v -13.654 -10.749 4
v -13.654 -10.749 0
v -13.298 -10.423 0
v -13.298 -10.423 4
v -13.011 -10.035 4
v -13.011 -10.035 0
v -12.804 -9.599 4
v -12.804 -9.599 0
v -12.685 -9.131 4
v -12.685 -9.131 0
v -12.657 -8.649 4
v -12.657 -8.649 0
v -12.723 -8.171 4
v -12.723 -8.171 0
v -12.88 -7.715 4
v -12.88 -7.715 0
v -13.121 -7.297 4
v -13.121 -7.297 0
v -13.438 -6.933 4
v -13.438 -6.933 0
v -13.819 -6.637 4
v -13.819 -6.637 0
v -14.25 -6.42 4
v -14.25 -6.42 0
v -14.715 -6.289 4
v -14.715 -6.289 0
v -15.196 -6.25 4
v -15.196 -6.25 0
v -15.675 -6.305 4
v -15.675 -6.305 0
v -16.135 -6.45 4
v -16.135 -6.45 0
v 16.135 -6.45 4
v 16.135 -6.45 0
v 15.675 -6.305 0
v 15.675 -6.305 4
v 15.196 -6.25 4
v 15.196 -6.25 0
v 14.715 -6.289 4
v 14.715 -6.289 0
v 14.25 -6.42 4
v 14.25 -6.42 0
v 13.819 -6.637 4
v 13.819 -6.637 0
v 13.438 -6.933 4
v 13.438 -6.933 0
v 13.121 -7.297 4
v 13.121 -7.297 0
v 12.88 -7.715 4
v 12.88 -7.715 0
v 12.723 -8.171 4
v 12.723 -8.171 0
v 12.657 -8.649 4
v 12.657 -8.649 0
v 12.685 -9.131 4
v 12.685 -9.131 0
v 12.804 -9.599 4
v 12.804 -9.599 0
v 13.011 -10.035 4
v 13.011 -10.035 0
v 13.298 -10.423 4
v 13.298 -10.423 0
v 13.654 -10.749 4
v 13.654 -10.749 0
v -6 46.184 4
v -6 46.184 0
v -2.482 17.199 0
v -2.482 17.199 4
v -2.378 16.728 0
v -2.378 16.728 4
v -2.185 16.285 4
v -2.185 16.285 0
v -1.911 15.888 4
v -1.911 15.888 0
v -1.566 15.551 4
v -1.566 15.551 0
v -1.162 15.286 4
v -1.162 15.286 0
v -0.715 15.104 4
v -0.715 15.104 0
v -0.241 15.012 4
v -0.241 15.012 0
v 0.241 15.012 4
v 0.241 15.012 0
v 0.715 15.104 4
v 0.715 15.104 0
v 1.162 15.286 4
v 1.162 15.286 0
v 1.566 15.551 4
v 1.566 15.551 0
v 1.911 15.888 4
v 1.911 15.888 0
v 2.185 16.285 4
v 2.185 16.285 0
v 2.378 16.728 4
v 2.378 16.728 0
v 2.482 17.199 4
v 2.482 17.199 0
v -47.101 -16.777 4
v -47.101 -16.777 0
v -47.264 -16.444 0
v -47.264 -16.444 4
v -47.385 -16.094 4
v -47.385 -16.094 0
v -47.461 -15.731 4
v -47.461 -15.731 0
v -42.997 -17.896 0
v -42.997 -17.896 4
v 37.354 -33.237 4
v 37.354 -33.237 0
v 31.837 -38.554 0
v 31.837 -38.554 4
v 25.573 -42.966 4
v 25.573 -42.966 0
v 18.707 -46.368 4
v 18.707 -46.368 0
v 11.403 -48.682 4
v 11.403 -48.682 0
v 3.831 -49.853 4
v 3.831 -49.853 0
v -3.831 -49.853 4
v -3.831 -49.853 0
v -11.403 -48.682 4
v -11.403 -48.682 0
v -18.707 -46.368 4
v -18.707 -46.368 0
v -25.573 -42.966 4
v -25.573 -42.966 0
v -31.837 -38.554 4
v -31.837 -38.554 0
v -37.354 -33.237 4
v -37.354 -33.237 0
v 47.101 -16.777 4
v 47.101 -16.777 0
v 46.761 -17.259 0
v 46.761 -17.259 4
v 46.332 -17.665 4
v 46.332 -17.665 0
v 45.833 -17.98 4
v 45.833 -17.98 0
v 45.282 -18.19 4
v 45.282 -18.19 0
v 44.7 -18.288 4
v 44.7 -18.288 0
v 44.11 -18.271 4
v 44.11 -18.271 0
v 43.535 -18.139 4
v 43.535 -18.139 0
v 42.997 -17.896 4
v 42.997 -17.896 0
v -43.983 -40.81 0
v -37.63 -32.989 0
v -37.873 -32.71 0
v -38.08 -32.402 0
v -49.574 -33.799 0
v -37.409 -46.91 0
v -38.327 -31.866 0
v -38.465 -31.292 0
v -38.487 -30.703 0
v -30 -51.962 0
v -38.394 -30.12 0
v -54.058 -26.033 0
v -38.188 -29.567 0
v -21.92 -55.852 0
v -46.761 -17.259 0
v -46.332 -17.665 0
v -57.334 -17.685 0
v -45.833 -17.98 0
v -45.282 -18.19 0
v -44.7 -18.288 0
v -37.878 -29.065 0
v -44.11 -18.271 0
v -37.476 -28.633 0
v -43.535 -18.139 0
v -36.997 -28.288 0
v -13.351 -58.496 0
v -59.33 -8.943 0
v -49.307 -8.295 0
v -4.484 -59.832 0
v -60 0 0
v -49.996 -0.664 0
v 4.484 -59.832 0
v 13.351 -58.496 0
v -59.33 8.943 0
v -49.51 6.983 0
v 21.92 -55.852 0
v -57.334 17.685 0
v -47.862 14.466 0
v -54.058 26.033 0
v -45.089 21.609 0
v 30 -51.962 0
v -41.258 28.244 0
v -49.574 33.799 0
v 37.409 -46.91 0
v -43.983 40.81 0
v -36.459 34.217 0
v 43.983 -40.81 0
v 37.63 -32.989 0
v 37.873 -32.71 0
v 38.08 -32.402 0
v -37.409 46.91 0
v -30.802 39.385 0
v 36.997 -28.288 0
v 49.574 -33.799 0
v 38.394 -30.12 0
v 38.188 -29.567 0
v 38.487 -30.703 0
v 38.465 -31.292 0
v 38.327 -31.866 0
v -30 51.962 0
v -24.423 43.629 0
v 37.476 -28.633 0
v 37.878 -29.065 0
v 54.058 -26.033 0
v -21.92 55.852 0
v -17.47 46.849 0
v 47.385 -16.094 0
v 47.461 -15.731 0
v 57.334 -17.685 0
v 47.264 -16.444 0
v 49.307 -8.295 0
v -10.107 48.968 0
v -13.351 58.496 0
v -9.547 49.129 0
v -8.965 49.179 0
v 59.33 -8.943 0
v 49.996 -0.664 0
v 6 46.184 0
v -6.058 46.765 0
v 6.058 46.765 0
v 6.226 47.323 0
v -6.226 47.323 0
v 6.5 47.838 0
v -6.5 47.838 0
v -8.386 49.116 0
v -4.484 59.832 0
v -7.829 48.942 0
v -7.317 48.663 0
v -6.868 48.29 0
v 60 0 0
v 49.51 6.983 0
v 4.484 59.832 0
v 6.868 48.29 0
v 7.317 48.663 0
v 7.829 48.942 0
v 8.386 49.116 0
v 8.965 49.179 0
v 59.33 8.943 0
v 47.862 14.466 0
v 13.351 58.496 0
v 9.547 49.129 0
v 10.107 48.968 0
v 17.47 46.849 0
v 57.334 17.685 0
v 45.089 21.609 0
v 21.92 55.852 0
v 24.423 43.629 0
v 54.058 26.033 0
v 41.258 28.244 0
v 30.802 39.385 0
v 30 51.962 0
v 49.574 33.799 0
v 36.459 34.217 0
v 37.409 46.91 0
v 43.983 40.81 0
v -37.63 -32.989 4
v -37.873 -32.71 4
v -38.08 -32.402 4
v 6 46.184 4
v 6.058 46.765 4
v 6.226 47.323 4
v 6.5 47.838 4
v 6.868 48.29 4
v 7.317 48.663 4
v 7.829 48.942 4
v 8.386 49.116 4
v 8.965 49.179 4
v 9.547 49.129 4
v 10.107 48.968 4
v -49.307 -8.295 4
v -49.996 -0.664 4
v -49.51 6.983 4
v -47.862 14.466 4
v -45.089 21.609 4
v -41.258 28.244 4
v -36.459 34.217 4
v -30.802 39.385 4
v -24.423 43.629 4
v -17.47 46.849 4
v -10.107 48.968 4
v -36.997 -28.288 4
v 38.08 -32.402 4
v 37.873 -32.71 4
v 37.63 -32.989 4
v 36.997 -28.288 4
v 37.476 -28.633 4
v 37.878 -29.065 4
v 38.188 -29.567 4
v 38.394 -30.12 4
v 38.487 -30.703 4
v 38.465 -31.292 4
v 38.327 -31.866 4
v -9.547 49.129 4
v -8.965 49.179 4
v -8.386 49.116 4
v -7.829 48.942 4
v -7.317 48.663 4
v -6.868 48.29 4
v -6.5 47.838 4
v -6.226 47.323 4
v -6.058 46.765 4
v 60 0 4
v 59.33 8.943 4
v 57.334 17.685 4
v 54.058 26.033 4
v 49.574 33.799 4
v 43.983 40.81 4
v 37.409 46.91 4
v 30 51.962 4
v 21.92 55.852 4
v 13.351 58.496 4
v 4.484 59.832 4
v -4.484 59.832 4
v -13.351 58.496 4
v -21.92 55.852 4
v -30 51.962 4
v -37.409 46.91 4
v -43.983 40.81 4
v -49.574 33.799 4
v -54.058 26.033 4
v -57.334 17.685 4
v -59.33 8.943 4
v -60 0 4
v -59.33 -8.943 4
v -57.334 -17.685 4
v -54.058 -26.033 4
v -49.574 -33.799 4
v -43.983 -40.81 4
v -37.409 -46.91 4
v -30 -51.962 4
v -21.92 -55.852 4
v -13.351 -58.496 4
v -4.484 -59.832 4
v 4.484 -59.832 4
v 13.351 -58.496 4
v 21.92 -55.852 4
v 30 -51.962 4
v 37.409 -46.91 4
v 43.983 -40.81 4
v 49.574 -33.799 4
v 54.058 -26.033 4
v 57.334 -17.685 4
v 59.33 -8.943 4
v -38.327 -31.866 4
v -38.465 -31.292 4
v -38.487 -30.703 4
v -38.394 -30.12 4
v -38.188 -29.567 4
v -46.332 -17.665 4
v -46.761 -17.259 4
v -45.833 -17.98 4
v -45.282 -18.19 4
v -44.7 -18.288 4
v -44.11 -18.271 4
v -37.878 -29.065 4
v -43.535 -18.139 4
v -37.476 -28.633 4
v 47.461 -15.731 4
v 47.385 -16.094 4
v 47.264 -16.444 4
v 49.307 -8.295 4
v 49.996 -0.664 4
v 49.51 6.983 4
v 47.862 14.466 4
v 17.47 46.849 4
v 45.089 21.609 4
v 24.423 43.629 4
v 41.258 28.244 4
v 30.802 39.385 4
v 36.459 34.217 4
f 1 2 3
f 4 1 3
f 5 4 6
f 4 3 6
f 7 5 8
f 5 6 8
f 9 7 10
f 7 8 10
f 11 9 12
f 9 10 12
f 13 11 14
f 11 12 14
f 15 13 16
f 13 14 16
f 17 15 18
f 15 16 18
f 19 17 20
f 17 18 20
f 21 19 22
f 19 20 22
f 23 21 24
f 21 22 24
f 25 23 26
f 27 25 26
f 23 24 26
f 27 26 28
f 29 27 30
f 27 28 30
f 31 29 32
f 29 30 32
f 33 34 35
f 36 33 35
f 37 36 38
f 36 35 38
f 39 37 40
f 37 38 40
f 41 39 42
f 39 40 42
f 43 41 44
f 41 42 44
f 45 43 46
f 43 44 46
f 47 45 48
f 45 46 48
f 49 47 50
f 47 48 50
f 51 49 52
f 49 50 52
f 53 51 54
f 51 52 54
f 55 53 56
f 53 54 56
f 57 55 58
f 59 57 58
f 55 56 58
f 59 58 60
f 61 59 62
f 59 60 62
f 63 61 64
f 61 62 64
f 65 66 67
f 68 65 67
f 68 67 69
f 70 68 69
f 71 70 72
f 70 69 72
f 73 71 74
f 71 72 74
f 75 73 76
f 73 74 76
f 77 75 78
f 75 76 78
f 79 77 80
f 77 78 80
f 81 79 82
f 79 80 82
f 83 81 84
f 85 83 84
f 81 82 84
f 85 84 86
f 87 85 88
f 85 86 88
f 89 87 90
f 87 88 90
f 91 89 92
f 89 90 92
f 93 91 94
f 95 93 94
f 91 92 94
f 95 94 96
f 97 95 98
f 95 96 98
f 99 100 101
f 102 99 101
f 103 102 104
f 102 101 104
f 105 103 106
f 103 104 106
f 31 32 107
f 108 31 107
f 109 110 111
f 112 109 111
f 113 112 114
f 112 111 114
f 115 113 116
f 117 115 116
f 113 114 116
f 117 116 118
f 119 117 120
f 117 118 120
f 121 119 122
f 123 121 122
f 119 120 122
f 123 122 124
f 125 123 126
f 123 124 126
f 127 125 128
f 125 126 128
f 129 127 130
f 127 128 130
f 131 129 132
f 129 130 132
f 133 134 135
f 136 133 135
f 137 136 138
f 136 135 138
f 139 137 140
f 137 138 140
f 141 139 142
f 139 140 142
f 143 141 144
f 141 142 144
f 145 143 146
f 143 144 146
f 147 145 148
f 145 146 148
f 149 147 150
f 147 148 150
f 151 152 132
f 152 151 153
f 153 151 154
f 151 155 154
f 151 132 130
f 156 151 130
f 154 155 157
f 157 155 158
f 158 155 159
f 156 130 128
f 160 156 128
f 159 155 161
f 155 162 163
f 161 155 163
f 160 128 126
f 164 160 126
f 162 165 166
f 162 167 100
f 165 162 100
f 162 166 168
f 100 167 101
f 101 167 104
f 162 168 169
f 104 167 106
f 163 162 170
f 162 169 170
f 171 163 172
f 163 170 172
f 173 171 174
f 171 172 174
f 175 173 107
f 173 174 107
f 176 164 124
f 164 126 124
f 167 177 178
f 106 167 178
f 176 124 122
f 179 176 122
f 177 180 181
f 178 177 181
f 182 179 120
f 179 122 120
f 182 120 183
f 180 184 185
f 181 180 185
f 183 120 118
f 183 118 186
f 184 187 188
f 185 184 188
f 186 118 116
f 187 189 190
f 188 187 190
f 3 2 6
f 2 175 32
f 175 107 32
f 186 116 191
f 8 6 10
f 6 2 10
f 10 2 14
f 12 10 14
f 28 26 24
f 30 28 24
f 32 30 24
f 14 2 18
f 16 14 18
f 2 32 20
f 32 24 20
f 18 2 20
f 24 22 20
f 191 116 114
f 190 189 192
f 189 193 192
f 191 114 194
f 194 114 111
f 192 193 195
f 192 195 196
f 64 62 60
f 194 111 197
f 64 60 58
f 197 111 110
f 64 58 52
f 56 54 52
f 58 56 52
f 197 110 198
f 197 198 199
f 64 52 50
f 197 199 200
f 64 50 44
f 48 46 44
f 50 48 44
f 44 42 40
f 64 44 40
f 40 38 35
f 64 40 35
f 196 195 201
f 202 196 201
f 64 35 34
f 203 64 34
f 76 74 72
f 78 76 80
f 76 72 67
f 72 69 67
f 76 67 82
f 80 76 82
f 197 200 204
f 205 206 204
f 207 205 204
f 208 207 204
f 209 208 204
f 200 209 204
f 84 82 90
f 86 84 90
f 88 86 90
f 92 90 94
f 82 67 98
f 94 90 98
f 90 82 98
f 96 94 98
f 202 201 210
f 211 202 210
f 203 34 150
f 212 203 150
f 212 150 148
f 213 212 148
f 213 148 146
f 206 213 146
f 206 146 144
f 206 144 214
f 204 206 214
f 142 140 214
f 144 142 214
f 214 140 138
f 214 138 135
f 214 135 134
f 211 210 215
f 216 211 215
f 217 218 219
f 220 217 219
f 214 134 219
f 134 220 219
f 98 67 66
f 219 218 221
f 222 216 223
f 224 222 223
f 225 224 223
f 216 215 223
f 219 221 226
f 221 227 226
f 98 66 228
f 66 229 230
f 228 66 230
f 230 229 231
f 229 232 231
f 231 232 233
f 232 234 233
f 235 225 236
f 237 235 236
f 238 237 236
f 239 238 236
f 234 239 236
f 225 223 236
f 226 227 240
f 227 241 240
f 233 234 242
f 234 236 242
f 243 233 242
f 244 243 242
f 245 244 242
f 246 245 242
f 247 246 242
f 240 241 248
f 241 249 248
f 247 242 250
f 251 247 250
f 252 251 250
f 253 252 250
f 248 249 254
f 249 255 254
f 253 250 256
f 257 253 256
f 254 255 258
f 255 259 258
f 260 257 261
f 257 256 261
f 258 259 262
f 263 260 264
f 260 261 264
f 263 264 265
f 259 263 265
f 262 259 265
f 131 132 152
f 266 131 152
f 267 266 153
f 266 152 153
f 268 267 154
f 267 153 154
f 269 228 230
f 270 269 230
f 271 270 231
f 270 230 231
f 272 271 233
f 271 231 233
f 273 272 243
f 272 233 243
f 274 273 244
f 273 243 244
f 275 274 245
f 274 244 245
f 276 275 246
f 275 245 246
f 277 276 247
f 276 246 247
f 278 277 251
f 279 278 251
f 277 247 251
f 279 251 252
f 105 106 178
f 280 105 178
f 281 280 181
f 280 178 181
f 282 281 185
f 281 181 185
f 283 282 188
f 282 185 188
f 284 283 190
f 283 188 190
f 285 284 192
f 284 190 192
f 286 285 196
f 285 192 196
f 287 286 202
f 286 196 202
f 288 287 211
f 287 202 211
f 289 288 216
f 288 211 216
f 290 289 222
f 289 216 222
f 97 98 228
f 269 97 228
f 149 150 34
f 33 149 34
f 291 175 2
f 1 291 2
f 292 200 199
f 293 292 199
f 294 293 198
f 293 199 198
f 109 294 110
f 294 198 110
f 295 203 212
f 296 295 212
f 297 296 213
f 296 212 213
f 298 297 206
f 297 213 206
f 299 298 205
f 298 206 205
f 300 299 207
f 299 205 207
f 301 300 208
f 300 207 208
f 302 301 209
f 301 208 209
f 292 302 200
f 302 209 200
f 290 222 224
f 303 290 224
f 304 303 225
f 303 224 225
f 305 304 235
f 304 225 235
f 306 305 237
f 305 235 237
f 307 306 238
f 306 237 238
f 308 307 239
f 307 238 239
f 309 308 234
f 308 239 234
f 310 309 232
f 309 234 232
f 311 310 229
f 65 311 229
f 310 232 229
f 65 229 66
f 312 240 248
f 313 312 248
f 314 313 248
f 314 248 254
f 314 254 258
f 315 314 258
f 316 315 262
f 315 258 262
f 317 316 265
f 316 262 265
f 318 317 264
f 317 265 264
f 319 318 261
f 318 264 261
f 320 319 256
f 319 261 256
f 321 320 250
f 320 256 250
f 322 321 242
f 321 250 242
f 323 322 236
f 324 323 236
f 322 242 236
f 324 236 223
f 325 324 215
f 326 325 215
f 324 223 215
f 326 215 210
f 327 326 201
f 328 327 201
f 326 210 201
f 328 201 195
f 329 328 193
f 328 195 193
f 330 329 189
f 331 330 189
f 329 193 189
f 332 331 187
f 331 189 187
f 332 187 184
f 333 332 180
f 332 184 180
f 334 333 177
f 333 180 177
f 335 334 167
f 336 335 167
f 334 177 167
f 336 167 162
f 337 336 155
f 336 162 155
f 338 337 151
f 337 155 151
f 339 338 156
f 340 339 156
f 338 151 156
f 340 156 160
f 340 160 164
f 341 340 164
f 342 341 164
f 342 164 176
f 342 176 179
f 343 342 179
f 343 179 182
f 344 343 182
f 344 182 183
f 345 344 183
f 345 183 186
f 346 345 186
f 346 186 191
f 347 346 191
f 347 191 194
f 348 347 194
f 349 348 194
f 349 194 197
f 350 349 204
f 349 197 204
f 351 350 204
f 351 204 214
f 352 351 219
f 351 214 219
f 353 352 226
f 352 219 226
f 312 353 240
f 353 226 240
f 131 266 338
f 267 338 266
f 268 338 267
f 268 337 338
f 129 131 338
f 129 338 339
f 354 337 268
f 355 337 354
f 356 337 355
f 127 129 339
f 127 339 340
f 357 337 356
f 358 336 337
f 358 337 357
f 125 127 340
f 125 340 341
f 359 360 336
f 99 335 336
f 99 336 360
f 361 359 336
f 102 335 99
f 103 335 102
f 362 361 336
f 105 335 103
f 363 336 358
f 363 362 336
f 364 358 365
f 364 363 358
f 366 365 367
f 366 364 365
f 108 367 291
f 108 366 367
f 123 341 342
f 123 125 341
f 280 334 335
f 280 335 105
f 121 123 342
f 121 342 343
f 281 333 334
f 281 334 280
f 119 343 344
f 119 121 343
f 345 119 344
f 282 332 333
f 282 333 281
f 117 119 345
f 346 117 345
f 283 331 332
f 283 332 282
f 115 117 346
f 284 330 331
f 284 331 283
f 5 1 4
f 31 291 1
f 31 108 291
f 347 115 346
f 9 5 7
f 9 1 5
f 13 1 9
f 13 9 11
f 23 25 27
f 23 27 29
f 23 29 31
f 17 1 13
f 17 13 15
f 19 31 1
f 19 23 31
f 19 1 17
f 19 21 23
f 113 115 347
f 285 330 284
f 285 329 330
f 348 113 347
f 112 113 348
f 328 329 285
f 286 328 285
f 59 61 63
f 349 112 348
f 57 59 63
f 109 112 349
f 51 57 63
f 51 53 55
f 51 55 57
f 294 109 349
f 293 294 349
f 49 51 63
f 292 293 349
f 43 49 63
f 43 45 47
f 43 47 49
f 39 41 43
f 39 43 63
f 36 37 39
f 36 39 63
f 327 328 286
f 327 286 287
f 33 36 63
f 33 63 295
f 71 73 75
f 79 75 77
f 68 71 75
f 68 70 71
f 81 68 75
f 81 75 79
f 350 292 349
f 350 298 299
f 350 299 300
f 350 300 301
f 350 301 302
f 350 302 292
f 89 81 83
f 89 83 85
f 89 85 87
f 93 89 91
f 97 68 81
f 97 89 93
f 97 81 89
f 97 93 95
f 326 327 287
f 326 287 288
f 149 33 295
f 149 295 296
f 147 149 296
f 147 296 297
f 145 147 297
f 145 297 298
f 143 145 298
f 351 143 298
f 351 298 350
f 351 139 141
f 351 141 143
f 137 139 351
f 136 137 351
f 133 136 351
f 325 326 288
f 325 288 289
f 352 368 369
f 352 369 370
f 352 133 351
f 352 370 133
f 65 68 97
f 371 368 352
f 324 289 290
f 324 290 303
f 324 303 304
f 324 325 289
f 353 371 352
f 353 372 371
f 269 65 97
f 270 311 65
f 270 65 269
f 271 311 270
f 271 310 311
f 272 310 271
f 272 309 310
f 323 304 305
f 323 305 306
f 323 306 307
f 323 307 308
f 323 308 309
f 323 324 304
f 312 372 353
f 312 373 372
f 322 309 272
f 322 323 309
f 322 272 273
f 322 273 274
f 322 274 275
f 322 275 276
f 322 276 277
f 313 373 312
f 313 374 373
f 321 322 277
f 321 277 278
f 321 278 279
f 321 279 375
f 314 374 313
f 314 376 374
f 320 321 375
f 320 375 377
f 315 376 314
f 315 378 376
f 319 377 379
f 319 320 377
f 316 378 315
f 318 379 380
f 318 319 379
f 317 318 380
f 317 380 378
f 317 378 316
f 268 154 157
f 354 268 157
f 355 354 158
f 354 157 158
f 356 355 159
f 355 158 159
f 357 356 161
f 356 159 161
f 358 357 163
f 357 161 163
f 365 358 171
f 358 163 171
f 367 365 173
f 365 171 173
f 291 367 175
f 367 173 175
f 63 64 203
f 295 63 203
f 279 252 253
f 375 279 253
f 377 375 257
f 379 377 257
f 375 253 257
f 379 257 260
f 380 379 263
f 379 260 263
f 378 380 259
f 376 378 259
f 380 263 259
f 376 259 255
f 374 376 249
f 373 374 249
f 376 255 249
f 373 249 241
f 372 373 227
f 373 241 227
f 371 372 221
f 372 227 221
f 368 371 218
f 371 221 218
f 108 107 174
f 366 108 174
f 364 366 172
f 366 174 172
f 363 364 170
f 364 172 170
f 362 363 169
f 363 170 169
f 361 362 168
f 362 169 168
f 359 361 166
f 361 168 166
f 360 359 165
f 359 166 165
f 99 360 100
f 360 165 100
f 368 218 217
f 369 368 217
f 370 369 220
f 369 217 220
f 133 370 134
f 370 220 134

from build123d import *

# Parameters (mm, degrees)
F0_R     = 60
F1_DEPTH = 4


with BuildPart() as f1:
    # F0 (on Top) → F1 (new body)
    with BuildSketch(Plane.XY):
        Circle(F0_R)
        with BuildLine():
            ThreePointArc((6, 46.184288), (7.316863, 48.662894), (10.106957, 48.967841))
            ThreePointArc((10.106957, 48.967841), (43.30127, 25), (47.460872, -15.731039))
            ThreePointArc((47.460872, -15.731039), (47.329687, -16.27085), (47.10122, -16.777219))
            ThreePointArc((47.10122, -16.777219), (45.281593, -18.189946), (42.996767, -17.895992))
            Line((42.996767, -17.895992), (16.13546, -6.450094))
            ThreePointArc((16.13546, -6.450094), (12.990381, -7.5), (13.653675, -10.748671))
            Line((13.653675, -10.748671), (36.996767, -28.288297))
            ThreePointArc((36.996767, -28.288297), (38.393752, -30.120037), (38.080108, -32.402244))
            ThreePointArc((38.080108, -32.402244), (37.755813, -32.853286), (37.353916, -33.236802))
            ThreePointArc((37.353916, -33.236802), (0, -50), (-37.353916, -33.236802))
            ThreePointArc((-37.353916, -33.236802), (-37.755813, -32.853286), (-38.080108, -32.402244))
            ThreePointArc((-38.080108, -32.402244), (-38.393752, -30.120037), (-36.996767, -28.288297))
            Line((-36.996767, -28.288297), (-13.653675, -10.748671))
            ThreePointArc((-13.653675, -10.748671), (-12.990381, -7.5), (-16.13546, -6.450094))
            Line((-16.13546, -6.450094), (-42.996767, -17.895992))
            ThreePointArc((-42.996767, -17.895992), (-45.281593, -18.189946), (-47.10122, -16.777219))
            ThreePointArc((-47.10122, -16.777219), (-47.329687, -16.27085), (-47.460872, -15.731039))
            ThreePointArc((-47.460872, -15.731039), (-43.30127, 25), (-10.106957, 48.967841))
            ThreePointArc((-10.106957, 48.967841), (-7.316863, 48.662894), (-6, 46.184288))
            Line((-6, 46.184288), (-2.481785, 17.198765))
            ThreePointArc((-2.481785, 17.198765), (0, 15), (2.481785, 17.198765))
            Line((2.481785, 17.198765), (6, 46.184288))
        make_face(mode=Mode.SUBTRACT)
    extrude(amount=F1_DEPTH)


solid = f1.part
